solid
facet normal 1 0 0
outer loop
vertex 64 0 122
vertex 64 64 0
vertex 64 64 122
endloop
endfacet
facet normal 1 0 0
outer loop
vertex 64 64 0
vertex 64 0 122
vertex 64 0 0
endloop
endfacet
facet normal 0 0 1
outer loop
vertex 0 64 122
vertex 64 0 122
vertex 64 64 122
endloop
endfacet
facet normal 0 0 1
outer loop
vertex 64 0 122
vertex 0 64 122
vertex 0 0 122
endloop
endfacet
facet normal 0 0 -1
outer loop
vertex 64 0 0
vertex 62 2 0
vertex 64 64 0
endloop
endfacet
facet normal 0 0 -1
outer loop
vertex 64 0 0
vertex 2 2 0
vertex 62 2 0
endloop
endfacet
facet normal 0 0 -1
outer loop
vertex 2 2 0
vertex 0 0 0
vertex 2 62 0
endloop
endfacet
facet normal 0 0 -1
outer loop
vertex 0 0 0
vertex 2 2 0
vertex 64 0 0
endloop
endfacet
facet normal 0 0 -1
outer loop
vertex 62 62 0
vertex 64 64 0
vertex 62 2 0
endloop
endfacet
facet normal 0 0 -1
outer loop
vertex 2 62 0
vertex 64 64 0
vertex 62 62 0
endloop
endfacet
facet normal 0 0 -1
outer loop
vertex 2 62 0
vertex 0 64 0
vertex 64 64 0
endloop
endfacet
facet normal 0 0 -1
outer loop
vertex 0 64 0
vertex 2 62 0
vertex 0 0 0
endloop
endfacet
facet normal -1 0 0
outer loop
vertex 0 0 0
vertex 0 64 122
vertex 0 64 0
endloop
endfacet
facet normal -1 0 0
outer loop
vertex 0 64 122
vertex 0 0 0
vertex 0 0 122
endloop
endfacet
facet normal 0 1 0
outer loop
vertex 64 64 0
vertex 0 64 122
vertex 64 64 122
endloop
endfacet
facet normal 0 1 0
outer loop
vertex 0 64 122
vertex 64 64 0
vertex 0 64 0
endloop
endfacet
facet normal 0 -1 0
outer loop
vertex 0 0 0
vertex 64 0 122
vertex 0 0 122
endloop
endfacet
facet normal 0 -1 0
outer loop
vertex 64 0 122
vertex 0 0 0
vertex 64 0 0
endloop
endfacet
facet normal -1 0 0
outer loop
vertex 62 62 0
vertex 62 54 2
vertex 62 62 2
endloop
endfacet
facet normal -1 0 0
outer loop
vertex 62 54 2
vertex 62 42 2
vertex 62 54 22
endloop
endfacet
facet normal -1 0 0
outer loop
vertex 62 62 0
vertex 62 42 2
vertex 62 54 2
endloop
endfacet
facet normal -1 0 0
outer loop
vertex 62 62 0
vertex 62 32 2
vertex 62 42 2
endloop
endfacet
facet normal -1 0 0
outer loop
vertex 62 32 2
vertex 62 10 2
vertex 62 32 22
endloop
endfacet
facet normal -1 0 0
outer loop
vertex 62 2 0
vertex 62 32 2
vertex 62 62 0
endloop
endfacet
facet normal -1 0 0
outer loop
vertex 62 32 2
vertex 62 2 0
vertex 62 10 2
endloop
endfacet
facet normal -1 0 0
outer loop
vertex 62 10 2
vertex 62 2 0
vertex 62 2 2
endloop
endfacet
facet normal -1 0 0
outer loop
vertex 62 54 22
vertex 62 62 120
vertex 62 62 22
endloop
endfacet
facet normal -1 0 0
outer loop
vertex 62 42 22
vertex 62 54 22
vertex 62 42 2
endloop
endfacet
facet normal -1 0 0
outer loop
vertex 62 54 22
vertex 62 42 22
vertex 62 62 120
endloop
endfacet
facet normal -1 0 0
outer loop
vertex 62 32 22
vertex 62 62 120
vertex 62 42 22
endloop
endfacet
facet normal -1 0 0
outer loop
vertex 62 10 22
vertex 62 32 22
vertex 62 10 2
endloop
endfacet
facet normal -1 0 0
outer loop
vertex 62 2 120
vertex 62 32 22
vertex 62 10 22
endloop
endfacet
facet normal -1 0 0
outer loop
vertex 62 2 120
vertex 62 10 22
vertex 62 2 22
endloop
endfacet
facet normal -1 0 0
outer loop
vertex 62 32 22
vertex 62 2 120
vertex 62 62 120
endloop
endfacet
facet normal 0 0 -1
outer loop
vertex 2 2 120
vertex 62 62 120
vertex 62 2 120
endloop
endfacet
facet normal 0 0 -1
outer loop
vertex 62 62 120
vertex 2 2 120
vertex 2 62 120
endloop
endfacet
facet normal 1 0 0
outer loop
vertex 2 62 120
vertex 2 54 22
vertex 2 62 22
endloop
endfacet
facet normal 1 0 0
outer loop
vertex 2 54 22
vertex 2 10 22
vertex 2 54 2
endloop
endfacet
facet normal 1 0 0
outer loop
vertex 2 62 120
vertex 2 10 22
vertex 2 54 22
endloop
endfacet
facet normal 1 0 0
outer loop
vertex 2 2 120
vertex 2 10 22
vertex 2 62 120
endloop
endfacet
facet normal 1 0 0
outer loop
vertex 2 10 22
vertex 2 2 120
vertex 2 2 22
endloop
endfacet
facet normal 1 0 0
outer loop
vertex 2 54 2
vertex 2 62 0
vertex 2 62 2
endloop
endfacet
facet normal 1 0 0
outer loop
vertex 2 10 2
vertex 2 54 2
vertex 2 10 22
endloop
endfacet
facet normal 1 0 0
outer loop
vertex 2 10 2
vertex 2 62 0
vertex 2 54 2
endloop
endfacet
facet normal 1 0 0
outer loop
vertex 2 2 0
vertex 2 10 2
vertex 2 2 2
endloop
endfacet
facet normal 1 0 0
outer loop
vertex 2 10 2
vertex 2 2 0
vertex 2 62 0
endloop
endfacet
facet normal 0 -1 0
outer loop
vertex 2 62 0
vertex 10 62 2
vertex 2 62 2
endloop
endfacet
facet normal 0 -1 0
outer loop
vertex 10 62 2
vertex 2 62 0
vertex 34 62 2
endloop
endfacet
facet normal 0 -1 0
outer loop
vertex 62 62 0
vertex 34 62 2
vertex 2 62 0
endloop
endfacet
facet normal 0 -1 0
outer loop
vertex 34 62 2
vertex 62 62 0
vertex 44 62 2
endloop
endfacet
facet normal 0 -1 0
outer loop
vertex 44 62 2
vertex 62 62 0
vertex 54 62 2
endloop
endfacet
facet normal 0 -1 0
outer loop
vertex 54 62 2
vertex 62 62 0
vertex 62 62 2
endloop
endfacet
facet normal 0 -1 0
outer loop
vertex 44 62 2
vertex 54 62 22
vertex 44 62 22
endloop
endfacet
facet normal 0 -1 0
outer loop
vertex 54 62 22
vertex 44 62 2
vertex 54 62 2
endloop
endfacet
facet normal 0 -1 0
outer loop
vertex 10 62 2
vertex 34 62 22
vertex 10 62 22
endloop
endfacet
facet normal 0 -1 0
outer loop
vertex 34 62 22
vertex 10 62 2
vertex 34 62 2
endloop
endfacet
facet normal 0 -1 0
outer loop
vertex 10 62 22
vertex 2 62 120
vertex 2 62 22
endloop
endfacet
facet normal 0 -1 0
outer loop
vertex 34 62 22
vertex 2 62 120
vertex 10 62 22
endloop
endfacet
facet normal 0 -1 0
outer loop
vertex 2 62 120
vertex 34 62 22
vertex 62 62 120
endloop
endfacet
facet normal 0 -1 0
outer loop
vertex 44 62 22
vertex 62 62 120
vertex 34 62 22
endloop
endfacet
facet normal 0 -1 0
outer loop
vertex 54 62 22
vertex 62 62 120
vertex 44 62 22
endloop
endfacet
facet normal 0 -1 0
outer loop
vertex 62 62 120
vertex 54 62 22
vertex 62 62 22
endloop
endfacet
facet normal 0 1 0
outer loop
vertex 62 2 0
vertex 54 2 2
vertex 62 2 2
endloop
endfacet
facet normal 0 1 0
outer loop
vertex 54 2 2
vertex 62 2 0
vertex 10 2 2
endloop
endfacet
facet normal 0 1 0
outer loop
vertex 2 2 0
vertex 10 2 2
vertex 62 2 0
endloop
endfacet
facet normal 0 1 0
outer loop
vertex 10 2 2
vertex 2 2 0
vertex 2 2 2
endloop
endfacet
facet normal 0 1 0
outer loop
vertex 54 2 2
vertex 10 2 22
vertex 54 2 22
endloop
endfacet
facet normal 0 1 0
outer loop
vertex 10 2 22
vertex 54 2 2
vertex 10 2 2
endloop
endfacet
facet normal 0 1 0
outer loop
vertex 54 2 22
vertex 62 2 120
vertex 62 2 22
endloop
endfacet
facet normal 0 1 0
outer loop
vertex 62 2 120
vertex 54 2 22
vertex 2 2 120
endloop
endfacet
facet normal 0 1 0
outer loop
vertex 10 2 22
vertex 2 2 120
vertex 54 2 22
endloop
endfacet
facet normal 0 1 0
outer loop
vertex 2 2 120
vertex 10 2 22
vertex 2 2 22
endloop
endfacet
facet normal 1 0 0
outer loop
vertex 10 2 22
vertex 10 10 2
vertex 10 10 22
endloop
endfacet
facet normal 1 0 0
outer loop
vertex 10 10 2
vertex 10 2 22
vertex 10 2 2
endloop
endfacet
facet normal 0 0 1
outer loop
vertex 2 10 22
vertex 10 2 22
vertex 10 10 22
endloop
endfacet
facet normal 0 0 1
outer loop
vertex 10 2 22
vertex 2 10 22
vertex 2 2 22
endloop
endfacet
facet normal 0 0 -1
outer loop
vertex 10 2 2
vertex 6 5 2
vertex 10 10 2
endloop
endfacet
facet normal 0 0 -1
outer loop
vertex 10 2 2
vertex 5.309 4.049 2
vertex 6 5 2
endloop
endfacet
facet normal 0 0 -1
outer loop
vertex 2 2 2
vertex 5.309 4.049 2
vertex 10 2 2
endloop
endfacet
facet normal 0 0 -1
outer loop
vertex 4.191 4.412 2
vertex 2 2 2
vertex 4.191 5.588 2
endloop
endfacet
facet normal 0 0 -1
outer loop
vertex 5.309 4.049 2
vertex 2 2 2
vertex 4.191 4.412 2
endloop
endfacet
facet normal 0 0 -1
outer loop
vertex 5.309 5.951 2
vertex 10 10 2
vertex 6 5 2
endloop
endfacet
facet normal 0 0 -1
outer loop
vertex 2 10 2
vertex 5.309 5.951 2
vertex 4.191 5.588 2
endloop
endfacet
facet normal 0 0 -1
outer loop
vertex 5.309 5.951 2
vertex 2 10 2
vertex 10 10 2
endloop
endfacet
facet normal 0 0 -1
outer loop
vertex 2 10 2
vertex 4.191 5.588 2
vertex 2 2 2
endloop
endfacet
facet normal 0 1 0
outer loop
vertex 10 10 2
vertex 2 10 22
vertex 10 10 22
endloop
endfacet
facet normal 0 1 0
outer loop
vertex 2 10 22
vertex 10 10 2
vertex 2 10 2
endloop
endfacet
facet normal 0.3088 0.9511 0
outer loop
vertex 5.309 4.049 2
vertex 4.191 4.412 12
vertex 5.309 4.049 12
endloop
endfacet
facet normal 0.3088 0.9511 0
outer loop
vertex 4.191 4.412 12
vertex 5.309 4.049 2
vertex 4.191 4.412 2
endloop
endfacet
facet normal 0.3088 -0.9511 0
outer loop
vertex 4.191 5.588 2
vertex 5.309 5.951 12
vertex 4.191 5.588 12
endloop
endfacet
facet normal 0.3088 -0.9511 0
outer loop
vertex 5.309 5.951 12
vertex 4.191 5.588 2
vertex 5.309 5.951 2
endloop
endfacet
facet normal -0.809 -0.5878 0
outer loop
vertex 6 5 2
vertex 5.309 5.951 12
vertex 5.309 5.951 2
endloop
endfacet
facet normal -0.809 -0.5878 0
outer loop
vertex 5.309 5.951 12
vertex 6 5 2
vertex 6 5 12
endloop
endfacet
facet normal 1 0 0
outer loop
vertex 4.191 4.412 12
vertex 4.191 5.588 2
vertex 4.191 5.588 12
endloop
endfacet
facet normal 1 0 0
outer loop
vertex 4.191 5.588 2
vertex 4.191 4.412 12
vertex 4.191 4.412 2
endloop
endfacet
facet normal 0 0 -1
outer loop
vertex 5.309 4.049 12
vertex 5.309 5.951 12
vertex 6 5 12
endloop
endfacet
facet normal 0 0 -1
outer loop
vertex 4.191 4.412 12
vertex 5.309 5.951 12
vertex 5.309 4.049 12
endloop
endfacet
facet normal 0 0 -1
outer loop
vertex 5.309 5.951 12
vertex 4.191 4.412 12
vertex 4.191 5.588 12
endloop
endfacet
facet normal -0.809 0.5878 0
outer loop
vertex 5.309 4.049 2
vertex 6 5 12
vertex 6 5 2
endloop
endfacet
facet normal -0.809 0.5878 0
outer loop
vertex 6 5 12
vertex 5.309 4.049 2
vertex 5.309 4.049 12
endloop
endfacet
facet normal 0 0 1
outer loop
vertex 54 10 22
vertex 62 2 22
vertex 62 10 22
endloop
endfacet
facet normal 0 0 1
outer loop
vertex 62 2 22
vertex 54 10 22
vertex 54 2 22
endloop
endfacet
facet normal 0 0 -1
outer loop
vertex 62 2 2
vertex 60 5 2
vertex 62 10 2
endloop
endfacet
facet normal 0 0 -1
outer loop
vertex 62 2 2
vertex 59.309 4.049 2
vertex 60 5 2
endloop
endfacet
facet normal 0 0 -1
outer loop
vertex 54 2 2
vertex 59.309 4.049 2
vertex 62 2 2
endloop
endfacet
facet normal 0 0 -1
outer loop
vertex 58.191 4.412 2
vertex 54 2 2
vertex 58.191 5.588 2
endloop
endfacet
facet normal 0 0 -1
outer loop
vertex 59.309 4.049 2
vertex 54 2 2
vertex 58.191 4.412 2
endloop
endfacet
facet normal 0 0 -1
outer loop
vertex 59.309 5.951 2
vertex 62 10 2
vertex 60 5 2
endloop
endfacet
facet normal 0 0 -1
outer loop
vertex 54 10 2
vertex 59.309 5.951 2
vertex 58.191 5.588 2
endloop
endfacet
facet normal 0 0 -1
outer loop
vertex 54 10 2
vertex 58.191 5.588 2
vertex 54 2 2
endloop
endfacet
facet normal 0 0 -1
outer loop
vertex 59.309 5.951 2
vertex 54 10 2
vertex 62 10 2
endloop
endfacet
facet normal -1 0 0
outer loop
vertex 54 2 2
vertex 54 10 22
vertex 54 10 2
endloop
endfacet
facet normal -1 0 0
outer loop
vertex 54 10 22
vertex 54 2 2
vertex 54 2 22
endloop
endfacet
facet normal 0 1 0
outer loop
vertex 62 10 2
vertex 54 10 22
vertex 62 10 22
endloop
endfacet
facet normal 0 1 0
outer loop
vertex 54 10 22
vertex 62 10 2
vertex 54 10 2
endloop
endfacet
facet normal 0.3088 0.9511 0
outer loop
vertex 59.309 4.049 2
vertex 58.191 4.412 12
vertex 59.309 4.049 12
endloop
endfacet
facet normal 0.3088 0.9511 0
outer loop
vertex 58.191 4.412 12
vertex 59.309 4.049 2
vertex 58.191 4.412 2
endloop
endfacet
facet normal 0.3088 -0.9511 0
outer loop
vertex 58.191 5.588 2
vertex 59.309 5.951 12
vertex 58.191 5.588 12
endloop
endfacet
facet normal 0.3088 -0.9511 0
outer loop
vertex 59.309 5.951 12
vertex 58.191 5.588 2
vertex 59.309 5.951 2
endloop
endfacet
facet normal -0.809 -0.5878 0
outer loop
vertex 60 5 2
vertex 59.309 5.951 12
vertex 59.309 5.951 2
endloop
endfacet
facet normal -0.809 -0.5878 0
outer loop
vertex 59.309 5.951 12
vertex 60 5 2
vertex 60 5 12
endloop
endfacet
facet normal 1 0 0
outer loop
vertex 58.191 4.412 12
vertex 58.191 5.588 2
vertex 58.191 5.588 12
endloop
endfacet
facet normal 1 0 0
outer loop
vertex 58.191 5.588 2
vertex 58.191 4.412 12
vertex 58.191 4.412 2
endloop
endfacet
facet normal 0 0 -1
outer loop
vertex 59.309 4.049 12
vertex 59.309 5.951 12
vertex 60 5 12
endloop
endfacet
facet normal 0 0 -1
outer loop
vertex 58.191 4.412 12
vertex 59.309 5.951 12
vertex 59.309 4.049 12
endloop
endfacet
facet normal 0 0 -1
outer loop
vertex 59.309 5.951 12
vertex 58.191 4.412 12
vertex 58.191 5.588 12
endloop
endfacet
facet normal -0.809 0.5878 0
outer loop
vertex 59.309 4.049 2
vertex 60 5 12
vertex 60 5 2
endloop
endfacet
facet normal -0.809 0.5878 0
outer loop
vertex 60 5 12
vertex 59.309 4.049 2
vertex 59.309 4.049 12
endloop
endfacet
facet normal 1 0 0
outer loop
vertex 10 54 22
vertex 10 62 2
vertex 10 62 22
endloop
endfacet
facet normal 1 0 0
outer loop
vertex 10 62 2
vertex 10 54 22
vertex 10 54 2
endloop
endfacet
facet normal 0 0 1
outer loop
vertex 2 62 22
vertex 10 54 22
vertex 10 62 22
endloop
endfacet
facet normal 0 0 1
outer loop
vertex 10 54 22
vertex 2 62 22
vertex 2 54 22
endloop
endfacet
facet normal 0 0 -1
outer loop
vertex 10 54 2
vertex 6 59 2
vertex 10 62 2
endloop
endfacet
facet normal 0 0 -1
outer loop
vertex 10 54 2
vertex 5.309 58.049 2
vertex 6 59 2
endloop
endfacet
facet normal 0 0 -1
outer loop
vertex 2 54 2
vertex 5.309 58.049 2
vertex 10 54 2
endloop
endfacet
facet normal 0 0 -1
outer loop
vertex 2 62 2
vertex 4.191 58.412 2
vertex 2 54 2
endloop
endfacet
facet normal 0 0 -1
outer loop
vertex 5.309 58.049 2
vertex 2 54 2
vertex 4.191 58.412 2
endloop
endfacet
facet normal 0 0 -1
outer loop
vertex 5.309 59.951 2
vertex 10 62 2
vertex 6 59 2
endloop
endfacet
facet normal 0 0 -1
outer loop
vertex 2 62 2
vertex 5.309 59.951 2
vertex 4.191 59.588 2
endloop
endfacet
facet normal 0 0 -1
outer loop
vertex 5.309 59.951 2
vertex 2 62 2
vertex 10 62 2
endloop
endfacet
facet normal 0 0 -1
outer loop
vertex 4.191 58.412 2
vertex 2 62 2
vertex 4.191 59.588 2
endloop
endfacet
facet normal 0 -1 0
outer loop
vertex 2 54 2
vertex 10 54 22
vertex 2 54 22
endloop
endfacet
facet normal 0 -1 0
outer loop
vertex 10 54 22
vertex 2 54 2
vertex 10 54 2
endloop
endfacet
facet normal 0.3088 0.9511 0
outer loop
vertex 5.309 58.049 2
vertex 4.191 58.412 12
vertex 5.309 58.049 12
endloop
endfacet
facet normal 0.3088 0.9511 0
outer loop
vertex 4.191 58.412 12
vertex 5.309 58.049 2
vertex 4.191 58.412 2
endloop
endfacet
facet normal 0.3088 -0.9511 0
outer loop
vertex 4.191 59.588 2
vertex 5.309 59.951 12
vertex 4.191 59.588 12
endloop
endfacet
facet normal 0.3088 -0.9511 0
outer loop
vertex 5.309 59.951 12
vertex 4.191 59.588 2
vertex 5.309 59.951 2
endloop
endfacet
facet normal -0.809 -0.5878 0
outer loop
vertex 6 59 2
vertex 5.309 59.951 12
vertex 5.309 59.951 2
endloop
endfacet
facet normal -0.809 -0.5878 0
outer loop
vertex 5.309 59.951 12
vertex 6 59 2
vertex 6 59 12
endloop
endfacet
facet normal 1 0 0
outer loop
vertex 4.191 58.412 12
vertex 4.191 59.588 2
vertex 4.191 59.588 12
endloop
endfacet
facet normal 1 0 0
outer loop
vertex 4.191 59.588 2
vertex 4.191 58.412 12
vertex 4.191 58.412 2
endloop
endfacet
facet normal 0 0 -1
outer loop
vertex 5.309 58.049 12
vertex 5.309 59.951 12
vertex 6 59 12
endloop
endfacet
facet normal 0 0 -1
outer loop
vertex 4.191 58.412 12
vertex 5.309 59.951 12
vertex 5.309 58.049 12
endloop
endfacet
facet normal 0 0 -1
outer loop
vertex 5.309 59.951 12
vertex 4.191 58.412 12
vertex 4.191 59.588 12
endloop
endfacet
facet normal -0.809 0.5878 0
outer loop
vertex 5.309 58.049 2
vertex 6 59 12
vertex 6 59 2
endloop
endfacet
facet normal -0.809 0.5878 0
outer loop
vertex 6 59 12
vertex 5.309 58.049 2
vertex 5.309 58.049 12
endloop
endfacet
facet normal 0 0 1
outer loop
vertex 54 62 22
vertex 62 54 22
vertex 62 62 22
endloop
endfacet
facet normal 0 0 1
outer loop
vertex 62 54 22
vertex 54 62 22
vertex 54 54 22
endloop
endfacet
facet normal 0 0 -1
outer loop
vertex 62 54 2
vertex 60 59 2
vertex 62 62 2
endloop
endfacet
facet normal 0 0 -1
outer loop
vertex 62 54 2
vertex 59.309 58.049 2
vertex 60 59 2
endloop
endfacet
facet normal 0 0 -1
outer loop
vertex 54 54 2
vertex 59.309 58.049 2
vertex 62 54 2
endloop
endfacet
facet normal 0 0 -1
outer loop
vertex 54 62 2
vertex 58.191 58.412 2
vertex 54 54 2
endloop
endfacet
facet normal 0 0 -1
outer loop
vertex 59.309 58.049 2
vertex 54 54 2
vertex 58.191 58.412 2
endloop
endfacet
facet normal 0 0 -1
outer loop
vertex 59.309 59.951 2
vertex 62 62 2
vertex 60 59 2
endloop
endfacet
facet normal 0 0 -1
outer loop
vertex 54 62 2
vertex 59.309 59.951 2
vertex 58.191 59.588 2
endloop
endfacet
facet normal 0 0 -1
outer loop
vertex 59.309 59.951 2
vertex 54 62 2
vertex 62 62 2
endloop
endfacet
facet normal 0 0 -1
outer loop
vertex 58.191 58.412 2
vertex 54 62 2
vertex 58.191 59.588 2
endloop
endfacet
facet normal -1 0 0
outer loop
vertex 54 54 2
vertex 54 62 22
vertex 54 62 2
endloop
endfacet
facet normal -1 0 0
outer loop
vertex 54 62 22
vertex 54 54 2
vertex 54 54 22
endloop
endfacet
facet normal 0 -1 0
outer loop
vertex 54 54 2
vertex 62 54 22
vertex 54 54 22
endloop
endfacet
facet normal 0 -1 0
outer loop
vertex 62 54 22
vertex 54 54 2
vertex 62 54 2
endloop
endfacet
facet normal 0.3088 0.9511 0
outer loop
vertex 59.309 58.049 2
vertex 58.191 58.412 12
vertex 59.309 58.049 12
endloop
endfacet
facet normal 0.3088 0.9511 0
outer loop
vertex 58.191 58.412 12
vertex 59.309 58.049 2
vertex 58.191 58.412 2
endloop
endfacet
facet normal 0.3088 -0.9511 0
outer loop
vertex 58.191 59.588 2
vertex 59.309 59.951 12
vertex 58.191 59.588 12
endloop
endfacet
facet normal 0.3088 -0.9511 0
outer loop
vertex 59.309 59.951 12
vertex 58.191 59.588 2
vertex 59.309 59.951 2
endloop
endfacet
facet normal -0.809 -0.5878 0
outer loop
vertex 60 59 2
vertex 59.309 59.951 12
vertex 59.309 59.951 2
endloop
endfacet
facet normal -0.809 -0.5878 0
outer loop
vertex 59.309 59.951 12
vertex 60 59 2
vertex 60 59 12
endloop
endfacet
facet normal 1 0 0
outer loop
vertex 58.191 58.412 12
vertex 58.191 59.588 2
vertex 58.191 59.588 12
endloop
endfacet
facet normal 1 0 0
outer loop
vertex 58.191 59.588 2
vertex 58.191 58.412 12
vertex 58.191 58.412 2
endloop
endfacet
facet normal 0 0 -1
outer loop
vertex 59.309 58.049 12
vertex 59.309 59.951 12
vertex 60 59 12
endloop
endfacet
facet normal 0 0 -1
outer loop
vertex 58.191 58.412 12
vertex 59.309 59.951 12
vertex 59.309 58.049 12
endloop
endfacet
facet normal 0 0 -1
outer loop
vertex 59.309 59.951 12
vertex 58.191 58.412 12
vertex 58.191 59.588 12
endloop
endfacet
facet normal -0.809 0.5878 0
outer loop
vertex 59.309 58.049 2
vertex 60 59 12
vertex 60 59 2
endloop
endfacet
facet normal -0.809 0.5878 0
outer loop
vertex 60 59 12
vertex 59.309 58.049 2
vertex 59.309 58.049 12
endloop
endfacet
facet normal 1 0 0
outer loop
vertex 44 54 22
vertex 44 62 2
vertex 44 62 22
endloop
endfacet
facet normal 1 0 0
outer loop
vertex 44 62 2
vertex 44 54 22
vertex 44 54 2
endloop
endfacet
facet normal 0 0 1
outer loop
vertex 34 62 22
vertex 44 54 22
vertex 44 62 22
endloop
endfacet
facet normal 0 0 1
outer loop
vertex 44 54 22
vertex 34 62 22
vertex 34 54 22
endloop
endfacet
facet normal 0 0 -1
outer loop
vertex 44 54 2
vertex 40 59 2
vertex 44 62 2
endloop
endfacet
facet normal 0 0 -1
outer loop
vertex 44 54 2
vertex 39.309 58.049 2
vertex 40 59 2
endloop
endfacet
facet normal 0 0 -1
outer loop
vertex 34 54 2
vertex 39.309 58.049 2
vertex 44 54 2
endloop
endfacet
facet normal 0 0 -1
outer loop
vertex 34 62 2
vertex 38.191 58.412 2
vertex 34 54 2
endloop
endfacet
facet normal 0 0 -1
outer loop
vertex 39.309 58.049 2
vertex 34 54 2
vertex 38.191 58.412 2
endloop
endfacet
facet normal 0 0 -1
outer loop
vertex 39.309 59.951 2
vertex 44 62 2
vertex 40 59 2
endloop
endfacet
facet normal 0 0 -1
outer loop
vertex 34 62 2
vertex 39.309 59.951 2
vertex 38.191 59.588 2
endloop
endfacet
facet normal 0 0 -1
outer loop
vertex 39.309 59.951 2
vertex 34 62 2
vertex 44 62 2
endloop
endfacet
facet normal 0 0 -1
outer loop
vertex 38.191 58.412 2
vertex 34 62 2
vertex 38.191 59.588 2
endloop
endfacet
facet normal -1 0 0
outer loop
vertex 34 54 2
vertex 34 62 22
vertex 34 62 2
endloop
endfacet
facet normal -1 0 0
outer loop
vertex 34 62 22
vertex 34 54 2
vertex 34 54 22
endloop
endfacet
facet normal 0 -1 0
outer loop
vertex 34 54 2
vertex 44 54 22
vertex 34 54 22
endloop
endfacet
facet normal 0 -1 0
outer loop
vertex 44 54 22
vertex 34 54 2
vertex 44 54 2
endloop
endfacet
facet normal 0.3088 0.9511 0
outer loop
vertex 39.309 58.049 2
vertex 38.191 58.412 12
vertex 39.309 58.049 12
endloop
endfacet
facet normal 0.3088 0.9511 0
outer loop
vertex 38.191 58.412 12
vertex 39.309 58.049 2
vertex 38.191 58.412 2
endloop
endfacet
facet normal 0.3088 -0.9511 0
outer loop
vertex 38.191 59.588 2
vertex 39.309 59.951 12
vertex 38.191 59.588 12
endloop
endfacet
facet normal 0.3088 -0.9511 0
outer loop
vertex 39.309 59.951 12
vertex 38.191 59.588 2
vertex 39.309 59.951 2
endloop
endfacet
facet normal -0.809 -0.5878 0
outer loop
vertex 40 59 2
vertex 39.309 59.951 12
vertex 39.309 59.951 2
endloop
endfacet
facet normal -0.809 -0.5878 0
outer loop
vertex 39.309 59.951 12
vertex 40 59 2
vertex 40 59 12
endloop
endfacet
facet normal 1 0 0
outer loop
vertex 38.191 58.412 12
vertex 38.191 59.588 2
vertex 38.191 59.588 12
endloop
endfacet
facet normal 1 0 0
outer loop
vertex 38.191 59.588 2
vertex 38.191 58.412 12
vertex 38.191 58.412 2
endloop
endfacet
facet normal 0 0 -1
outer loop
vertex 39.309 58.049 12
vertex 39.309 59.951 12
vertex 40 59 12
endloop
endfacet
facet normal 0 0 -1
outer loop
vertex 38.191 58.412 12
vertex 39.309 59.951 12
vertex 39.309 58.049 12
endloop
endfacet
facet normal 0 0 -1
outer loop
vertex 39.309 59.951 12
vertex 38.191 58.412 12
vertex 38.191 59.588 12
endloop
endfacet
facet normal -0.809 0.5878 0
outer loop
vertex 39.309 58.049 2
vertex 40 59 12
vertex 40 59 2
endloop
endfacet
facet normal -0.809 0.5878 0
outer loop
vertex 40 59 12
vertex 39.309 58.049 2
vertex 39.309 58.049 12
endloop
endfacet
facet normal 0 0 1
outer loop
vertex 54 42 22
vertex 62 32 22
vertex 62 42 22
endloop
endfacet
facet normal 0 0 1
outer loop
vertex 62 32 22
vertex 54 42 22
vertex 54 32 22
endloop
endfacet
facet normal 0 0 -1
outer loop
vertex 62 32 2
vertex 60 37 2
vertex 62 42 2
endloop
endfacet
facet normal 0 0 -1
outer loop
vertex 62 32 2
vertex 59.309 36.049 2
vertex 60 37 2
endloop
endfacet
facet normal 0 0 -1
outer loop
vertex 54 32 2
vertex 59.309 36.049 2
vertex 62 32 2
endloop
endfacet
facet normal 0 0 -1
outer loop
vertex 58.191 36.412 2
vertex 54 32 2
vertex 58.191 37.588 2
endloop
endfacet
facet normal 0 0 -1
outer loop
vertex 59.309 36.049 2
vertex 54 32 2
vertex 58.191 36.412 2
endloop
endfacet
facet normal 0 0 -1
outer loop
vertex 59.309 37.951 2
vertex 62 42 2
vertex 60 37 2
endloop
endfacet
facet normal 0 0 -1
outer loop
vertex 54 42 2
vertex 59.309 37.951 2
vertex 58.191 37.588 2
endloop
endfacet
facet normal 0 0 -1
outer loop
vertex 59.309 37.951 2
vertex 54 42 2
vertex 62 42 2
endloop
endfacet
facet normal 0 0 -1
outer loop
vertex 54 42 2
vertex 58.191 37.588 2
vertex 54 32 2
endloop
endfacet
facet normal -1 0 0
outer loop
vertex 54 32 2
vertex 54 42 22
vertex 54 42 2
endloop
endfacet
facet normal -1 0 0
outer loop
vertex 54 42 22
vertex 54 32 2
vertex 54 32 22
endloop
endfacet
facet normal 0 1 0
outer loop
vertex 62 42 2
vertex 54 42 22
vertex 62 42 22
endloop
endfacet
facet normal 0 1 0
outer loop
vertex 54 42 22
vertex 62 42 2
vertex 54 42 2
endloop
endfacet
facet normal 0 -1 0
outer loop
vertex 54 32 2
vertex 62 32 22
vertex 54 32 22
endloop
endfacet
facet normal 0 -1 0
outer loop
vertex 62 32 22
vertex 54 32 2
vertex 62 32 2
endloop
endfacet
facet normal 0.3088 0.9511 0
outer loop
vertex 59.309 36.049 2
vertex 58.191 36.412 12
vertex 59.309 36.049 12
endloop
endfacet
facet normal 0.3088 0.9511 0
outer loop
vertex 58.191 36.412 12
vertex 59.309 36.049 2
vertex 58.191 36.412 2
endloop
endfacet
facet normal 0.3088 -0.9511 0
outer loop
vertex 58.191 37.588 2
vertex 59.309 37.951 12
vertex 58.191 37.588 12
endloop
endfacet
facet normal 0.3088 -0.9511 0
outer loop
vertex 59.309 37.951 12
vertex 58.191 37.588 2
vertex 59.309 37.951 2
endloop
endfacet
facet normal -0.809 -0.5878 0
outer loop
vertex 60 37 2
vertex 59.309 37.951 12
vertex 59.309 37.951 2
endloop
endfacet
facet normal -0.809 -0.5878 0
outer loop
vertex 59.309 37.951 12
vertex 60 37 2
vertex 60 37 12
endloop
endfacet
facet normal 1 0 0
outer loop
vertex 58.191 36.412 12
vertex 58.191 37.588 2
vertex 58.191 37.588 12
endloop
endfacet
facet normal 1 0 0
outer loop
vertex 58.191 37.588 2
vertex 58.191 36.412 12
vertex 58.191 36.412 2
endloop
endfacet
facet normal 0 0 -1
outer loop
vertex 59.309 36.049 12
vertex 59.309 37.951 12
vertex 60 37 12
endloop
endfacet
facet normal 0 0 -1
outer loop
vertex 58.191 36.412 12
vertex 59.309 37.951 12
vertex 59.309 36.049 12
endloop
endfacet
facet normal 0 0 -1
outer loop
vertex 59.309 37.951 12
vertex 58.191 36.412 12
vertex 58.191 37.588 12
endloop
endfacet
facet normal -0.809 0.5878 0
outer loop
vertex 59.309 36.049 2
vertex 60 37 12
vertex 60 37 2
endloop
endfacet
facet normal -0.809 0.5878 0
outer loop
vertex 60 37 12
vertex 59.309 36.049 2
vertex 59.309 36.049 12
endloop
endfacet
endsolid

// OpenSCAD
// Height of plug
plug_h = 120;
// Diameter of plug
plug_d = 60;
// Thickness of walls
wall = 2;
// width of the mount for screws
mount = 10;
// diameter of hole for screws
screw = 2;
// diameter of cable
cable = 12;

difference() {
    cube([plug_d+2*wall,plug_d+2*wall,plug_h+wall]);
    translate([wall,wall,-wall])
        cube([plug_d,plug_d,plug_h+wall]);
}

screw();
translate([plug_d+2*wall-mount,0,0])
    screw();
translate([0,plug_d+2*wall-mount,0])
    screw();
translate([plug_d+2*wall-mount,plug_d+2*wall-mount,0])
    screw();
translate([plug_d/2+2*wall,plug_d+2*wall-mount,0])
    screw();
translate([plug_d+2*wall-mount,plug_d/2+wall,0])
    screw();

module screw() {
    translate([0,0,wall])
        difference() {
            cube([mount,mount,20]);
            translate([mount/2,mount/2,0]) {
                cylinder(d=screw,h=10);
            }
        }
}
